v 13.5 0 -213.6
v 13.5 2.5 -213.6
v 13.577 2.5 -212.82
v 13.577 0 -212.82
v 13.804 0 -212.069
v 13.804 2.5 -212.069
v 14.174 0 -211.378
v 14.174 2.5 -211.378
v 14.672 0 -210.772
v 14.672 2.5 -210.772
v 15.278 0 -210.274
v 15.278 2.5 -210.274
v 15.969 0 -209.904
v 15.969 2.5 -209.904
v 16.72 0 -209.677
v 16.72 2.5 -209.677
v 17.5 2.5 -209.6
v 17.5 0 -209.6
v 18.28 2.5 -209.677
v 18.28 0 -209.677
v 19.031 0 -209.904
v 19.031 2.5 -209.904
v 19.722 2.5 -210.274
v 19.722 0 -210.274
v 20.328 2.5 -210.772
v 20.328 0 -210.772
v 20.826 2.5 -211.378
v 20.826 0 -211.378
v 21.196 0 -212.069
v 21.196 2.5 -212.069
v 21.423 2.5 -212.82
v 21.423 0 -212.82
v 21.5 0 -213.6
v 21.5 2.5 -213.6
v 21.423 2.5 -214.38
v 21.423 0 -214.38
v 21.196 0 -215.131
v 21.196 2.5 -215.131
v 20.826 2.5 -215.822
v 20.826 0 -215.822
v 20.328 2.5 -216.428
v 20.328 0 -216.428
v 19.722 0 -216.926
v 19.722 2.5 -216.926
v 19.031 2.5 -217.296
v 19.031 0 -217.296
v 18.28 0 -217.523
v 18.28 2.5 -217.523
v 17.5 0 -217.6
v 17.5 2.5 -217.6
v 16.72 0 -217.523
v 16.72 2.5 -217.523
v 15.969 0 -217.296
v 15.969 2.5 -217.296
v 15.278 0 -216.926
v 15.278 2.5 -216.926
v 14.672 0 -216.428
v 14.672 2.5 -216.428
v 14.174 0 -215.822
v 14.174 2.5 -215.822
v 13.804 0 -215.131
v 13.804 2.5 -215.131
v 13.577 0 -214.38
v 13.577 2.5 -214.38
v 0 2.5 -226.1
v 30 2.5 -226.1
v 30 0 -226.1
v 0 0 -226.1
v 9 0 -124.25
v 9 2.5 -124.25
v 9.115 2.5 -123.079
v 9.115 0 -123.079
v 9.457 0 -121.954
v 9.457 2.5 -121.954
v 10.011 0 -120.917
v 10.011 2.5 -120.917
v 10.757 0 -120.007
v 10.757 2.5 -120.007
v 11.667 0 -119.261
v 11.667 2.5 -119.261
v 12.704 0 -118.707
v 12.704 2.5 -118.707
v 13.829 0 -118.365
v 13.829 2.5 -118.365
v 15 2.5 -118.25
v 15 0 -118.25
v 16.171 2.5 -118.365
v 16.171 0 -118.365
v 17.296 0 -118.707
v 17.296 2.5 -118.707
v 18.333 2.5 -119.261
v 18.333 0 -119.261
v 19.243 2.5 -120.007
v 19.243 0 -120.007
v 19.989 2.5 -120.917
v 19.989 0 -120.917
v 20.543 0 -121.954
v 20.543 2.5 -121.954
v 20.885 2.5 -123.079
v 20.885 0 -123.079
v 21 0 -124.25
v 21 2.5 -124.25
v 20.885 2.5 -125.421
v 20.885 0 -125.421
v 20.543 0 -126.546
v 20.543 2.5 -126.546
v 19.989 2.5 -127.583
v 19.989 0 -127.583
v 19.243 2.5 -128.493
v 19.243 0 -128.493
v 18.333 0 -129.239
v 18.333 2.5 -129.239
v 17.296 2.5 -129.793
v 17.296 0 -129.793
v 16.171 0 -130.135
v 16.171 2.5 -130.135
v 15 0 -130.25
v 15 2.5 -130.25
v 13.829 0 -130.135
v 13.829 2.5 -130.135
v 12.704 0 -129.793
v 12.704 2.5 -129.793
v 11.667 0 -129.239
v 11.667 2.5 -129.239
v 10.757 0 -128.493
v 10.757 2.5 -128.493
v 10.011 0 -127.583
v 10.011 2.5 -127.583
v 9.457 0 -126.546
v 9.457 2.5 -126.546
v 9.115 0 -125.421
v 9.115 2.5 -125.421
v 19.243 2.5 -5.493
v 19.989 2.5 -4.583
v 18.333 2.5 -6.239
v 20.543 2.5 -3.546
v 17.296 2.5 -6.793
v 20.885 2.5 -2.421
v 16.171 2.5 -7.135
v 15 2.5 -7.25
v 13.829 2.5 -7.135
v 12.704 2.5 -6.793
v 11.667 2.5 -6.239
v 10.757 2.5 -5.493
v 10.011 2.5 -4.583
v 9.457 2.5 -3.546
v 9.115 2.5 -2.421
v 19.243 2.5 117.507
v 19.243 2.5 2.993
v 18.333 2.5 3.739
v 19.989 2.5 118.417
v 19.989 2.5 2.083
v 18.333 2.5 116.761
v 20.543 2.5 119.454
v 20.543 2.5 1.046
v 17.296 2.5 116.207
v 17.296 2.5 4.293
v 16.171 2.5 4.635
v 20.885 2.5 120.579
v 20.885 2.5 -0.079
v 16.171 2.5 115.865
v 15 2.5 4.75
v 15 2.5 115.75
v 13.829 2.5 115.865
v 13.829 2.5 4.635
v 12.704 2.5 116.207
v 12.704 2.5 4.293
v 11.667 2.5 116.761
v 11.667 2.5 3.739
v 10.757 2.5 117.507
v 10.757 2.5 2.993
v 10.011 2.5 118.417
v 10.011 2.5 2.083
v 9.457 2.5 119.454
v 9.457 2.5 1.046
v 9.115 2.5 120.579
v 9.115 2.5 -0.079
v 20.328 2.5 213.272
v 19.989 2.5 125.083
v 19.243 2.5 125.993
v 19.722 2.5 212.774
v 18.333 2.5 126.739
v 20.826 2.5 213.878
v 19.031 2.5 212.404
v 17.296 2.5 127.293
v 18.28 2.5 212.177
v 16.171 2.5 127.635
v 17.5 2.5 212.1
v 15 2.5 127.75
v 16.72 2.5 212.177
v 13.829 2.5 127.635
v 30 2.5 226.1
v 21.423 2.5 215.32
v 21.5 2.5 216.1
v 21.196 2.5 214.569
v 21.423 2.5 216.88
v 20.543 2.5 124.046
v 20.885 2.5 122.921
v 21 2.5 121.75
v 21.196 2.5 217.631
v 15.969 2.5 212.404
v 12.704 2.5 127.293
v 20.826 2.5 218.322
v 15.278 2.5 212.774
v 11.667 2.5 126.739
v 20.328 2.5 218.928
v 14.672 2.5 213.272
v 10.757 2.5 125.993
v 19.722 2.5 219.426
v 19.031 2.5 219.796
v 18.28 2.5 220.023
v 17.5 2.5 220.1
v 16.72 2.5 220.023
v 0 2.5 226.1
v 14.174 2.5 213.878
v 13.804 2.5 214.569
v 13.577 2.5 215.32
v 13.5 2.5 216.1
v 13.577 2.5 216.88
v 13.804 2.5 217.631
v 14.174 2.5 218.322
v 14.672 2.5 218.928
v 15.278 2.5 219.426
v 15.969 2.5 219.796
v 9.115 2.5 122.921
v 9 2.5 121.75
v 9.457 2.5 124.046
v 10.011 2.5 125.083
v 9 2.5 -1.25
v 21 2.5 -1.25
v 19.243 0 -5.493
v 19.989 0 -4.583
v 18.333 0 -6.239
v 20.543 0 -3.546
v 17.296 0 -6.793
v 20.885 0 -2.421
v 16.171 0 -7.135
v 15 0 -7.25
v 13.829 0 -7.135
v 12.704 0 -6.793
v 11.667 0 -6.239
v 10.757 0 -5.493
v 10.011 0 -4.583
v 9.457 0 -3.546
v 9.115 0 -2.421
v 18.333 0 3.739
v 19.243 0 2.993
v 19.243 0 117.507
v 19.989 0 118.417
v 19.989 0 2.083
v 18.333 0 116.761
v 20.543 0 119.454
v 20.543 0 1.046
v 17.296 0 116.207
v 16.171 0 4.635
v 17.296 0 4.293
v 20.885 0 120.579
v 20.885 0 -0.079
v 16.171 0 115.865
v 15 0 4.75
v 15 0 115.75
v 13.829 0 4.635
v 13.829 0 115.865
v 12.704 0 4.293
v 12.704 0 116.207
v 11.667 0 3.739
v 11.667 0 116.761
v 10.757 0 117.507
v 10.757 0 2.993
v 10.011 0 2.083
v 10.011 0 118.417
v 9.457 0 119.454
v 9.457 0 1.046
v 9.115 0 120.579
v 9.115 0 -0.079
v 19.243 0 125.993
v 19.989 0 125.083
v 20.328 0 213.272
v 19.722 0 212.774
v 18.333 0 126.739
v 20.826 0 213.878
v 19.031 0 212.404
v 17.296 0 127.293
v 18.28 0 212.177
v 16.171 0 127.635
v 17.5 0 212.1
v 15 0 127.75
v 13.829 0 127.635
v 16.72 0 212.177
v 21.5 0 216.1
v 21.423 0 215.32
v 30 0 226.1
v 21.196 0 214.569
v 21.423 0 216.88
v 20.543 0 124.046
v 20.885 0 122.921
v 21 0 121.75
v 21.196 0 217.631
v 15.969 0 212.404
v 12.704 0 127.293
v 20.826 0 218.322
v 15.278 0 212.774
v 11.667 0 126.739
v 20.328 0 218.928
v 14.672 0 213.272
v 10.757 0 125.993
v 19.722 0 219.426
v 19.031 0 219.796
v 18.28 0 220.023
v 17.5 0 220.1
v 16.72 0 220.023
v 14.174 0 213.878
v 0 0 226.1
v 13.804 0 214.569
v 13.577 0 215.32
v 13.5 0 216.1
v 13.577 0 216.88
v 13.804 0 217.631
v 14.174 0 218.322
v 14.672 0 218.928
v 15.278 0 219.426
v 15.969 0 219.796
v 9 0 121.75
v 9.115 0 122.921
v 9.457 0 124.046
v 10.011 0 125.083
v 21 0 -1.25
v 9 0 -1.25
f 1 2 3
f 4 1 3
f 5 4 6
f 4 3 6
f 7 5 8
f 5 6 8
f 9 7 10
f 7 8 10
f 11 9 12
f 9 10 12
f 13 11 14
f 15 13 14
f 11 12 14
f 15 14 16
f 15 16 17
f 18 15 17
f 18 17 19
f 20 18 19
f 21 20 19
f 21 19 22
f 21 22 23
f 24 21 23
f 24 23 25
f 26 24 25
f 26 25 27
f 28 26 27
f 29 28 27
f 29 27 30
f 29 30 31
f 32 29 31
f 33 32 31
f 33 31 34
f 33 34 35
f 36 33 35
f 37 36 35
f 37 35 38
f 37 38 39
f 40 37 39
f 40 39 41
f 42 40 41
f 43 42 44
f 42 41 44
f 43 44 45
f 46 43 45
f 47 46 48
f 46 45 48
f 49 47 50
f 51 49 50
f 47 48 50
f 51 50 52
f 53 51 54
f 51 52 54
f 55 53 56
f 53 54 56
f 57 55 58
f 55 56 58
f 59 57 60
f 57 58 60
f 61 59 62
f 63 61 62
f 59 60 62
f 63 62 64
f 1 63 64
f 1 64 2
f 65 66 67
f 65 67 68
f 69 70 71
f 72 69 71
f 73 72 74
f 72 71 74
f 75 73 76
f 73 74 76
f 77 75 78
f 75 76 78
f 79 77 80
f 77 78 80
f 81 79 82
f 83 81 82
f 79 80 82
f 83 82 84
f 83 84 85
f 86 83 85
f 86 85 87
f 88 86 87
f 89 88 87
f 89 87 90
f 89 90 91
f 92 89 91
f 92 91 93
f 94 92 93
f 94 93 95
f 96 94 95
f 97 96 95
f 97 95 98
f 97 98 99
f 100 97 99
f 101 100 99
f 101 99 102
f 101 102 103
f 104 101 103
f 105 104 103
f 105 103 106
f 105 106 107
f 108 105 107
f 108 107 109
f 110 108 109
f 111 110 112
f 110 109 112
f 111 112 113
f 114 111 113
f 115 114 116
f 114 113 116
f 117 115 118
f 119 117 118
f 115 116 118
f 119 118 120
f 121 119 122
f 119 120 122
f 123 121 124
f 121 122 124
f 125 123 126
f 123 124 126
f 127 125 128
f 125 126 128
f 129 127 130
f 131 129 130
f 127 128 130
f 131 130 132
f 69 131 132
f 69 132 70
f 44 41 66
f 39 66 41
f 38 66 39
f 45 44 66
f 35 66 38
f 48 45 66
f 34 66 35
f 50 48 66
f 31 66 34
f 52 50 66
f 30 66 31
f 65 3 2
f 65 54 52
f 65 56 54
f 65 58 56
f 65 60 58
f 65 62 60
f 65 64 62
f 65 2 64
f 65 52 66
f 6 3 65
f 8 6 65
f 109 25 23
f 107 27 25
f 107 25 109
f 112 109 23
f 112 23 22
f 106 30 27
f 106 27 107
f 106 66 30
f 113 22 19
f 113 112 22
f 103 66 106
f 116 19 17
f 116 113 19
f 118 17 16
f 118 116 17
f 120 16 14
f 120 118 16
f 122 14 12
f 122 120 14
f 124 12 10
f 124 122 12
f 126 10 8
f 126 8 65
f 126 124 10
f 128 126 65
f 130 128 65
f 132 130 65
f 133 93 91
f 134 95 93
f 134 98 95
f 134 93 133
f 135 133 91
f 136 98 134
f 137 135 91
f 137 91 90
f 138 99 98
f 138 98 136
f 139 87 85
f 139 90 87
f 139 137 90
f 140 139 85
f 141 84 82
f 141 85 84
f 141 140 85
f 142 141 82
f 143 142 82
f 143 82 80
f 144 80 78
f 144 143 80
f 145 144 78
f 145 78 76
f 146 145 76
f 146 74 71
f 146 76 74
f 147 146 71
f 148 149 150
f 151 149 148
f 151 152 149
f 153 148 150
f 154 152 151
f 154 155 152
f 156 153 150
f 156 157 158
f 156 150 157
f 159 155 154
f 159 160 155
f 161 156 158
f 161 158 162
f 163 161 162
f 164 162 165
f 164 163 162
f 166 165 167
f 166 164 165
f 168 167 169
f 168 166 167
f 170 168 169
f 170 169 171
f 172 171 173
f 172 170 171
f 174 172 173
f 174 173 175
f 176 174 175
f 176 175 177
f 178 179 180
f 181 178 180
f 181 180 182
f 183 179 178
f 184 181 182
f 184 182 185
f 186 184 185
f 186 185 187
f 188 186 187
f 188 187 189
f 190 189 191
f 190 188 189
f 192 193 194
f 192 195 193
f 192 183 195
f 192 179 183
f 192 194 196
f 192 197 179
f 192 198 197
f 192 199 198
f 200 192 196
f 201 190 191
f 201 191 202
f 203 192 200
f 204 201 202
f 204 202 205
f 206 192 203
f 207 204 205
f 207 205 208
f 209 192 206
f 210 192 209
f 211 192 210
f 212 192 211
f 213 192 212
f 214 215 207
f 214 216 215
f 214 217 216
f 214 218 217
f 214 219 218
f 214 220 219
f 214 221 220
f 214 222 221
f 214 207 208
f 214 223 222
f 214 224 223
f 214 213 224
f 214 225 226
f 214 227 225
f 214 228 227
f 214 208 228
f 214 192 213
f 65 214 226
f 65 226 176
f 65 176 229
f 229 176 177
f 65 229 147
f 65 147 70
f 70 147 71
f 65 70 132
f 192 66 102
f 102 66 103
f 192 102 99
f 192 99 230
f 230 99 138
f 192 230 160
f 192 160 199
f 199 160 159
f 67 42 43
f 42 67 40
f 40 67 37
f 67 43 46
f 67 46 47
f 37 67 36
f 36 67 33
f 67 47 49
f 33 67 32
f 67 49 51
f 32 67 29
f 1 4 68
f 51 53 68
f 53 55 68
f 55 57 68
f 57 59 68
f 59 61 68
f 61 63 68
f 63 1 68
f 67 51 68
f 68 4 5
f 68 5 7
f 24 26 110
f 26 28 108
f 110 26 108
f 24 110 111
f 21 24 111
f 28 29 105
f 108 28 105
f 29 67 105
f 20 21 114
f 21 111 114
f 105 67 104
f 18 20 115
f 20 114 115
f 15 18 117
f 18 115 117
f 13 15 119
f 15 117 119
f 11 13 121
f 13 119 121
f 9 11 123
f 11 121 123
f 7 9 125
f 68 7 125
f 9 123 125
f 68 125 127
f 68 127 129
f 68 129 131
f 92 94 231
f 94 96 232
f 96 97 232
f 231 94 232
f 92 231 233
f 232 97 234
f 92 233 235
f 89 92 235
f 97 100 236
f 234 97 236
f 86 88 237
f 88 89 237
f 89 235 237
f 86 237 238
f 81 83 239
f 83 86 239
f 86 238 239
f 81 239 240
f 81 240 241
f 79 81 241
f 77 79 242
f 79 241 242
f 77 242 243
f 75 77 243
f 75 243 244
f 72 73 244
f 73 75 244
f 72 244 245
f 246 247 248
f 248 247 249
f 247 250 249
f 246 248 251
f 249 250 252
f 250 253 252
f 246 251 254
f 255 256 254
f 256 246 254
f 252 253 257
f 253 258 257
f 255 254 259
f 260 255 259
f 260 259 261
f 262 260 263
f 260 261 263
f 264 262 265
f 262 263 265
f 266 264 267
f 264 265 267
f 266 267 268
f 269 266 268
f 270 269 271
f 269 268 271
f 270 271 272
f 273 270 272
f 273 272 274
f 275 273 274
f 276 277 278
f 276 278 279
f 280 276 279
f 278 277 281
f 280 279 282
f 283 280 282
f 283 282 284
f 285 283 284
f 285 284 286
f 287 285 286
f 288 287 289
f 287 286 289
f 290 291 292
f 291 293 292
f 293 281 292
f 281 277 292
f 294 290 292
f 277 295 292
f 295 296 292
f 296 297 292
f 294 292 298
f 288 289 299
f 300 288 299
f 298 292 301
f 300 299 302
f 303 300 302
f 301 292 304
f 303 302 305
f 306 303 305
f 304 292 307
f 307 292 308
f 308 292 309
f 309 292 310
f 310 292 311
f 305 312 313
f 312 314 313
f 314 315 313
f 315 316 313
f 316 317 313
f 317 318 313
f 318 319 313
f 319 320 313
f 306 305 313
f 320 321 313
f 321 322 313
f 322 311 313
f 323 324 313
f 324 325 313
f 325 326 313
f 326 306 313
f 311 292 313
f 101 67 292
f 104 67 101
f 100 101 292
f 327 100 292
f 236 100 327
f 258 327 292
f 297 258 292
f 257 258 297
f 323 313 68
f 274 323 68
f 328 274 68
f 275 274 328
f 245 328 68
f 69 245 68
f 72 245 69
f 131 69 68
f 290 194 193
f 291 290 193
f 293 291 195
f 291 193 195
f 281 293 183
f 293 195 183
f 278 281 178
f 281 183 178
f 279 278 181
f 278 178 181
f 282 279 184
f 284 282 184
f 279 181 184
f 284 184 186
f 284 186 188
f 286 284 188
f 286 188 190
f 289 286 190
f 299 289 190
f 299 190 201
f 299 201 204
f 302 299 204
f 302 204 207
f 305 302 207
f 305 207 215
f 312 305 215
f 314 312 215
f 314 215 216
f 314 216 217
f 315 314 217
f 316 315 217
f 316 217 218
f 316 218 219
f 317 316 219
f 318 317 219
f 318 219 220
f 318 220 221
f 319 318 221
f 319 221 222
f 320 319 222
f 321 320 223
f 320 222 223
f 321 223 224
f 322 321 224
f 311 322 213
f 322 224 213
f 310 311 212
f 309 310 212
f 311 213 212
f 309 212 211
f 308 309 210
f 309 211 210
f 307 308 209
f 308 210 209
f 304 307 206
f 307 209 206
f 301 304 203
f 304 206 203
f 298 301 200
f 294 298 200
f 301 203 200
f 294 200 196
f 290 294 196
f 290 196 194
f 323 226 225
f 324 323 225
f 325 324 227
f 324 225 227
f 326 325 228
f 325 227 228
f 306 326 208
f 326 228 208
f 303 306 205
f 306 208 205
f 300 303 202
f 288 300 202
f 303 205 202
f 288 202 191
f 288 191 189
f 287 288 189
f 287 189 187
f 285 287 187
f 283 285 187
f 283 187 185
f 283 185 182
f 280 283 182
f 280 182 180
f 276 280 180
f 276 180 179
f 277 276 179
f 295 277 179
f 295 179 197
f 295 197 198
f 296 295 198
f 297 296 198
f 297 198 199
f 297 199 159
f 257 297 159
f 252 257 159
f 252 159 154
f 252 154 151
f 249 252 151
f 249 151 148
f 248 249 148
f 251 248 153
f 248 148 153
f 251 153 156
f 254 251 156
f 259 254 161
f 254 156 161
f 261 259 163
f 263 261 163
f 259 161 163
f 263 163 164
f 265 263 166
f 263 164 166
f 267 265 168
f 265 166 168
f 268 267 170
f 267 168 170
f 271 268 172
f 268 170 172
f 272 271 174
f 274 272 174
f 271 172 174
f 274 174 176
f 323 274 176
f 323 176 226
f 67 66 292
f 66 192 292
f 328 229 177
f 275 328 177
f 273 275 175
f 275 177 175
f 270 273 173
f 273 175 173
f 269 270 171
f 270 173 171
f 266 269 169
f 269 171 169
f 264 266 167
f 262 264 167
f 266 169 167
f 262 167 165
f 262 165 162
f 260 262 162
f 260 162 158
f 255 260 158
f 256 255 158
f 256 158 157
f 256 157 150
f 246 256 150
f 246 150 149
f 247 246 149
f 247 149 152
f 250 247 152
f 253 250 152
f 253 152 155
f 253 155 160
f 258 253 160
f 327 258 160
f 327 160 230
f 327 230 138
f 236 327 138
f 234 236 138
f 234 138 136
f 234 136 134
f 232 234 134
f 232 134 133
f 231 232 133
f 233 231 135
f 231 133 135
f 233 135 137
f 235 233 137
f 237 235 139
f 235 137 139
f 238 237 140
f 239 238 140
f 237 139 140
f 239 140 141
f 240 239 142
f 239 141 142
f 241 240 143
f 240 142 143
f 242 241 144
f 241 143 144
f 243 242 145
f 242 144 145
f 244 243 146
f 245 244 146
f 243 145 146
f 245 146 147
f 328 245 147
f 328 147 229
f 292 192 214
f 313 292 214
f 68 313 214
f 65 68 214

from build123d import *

# Parameters (mm, degrees)
BOSS_EXTRUDE1_DEPTH = 226.1
SKETCH2_R           = 4
SKETCH2_R_2         = 6
CUT_EXTRUDE1_DEPTH  = 229.095287106


with BuildPart() as part:
    # Sketch1 → Boss-Extrude1 (new, symmetric)
    with BuildSketch(Plane.XY):
        Polygon((0, 0), (0, 2.5), (2.5, 2.5), (30, 2.5), (30, 0), align=None)
    extrude(amount=BOSS_EXTRUDE1_DEPTH, both=True)

    # Sketch2 → Cut-Extrude1 (cut, through all)
    with BuildSketch(Plane(origin=(0, 2.5, 0), x_dir=(1, 0, 0), z_dir=(0, 1, 0))):
        with Locations(Location((17.5, 213.6, 0), (0, 0, 180))):
            Circle(SKETCH2_R)
        with Locations((17.5, -216.1)):
            Circle(SKETCH2_R)
        with Locations(Location((15, -121.75, 0), (0, 0, 180))):
            Circle(SKETCH2_R_2)
        with Locations(Location((15, 124.25, 0), (0, 0, 180))):
            Circle(SKETCH2_R_2)
        with Locations(Location((15, 1.25, 0), (0, 0, 180))):
            Circle(SKETCH2_R_2)
    extrude(amount=-CUT_EXTRUDE1_DEPTH, mode=Mode.SUBTRACT)


solid = part.part
